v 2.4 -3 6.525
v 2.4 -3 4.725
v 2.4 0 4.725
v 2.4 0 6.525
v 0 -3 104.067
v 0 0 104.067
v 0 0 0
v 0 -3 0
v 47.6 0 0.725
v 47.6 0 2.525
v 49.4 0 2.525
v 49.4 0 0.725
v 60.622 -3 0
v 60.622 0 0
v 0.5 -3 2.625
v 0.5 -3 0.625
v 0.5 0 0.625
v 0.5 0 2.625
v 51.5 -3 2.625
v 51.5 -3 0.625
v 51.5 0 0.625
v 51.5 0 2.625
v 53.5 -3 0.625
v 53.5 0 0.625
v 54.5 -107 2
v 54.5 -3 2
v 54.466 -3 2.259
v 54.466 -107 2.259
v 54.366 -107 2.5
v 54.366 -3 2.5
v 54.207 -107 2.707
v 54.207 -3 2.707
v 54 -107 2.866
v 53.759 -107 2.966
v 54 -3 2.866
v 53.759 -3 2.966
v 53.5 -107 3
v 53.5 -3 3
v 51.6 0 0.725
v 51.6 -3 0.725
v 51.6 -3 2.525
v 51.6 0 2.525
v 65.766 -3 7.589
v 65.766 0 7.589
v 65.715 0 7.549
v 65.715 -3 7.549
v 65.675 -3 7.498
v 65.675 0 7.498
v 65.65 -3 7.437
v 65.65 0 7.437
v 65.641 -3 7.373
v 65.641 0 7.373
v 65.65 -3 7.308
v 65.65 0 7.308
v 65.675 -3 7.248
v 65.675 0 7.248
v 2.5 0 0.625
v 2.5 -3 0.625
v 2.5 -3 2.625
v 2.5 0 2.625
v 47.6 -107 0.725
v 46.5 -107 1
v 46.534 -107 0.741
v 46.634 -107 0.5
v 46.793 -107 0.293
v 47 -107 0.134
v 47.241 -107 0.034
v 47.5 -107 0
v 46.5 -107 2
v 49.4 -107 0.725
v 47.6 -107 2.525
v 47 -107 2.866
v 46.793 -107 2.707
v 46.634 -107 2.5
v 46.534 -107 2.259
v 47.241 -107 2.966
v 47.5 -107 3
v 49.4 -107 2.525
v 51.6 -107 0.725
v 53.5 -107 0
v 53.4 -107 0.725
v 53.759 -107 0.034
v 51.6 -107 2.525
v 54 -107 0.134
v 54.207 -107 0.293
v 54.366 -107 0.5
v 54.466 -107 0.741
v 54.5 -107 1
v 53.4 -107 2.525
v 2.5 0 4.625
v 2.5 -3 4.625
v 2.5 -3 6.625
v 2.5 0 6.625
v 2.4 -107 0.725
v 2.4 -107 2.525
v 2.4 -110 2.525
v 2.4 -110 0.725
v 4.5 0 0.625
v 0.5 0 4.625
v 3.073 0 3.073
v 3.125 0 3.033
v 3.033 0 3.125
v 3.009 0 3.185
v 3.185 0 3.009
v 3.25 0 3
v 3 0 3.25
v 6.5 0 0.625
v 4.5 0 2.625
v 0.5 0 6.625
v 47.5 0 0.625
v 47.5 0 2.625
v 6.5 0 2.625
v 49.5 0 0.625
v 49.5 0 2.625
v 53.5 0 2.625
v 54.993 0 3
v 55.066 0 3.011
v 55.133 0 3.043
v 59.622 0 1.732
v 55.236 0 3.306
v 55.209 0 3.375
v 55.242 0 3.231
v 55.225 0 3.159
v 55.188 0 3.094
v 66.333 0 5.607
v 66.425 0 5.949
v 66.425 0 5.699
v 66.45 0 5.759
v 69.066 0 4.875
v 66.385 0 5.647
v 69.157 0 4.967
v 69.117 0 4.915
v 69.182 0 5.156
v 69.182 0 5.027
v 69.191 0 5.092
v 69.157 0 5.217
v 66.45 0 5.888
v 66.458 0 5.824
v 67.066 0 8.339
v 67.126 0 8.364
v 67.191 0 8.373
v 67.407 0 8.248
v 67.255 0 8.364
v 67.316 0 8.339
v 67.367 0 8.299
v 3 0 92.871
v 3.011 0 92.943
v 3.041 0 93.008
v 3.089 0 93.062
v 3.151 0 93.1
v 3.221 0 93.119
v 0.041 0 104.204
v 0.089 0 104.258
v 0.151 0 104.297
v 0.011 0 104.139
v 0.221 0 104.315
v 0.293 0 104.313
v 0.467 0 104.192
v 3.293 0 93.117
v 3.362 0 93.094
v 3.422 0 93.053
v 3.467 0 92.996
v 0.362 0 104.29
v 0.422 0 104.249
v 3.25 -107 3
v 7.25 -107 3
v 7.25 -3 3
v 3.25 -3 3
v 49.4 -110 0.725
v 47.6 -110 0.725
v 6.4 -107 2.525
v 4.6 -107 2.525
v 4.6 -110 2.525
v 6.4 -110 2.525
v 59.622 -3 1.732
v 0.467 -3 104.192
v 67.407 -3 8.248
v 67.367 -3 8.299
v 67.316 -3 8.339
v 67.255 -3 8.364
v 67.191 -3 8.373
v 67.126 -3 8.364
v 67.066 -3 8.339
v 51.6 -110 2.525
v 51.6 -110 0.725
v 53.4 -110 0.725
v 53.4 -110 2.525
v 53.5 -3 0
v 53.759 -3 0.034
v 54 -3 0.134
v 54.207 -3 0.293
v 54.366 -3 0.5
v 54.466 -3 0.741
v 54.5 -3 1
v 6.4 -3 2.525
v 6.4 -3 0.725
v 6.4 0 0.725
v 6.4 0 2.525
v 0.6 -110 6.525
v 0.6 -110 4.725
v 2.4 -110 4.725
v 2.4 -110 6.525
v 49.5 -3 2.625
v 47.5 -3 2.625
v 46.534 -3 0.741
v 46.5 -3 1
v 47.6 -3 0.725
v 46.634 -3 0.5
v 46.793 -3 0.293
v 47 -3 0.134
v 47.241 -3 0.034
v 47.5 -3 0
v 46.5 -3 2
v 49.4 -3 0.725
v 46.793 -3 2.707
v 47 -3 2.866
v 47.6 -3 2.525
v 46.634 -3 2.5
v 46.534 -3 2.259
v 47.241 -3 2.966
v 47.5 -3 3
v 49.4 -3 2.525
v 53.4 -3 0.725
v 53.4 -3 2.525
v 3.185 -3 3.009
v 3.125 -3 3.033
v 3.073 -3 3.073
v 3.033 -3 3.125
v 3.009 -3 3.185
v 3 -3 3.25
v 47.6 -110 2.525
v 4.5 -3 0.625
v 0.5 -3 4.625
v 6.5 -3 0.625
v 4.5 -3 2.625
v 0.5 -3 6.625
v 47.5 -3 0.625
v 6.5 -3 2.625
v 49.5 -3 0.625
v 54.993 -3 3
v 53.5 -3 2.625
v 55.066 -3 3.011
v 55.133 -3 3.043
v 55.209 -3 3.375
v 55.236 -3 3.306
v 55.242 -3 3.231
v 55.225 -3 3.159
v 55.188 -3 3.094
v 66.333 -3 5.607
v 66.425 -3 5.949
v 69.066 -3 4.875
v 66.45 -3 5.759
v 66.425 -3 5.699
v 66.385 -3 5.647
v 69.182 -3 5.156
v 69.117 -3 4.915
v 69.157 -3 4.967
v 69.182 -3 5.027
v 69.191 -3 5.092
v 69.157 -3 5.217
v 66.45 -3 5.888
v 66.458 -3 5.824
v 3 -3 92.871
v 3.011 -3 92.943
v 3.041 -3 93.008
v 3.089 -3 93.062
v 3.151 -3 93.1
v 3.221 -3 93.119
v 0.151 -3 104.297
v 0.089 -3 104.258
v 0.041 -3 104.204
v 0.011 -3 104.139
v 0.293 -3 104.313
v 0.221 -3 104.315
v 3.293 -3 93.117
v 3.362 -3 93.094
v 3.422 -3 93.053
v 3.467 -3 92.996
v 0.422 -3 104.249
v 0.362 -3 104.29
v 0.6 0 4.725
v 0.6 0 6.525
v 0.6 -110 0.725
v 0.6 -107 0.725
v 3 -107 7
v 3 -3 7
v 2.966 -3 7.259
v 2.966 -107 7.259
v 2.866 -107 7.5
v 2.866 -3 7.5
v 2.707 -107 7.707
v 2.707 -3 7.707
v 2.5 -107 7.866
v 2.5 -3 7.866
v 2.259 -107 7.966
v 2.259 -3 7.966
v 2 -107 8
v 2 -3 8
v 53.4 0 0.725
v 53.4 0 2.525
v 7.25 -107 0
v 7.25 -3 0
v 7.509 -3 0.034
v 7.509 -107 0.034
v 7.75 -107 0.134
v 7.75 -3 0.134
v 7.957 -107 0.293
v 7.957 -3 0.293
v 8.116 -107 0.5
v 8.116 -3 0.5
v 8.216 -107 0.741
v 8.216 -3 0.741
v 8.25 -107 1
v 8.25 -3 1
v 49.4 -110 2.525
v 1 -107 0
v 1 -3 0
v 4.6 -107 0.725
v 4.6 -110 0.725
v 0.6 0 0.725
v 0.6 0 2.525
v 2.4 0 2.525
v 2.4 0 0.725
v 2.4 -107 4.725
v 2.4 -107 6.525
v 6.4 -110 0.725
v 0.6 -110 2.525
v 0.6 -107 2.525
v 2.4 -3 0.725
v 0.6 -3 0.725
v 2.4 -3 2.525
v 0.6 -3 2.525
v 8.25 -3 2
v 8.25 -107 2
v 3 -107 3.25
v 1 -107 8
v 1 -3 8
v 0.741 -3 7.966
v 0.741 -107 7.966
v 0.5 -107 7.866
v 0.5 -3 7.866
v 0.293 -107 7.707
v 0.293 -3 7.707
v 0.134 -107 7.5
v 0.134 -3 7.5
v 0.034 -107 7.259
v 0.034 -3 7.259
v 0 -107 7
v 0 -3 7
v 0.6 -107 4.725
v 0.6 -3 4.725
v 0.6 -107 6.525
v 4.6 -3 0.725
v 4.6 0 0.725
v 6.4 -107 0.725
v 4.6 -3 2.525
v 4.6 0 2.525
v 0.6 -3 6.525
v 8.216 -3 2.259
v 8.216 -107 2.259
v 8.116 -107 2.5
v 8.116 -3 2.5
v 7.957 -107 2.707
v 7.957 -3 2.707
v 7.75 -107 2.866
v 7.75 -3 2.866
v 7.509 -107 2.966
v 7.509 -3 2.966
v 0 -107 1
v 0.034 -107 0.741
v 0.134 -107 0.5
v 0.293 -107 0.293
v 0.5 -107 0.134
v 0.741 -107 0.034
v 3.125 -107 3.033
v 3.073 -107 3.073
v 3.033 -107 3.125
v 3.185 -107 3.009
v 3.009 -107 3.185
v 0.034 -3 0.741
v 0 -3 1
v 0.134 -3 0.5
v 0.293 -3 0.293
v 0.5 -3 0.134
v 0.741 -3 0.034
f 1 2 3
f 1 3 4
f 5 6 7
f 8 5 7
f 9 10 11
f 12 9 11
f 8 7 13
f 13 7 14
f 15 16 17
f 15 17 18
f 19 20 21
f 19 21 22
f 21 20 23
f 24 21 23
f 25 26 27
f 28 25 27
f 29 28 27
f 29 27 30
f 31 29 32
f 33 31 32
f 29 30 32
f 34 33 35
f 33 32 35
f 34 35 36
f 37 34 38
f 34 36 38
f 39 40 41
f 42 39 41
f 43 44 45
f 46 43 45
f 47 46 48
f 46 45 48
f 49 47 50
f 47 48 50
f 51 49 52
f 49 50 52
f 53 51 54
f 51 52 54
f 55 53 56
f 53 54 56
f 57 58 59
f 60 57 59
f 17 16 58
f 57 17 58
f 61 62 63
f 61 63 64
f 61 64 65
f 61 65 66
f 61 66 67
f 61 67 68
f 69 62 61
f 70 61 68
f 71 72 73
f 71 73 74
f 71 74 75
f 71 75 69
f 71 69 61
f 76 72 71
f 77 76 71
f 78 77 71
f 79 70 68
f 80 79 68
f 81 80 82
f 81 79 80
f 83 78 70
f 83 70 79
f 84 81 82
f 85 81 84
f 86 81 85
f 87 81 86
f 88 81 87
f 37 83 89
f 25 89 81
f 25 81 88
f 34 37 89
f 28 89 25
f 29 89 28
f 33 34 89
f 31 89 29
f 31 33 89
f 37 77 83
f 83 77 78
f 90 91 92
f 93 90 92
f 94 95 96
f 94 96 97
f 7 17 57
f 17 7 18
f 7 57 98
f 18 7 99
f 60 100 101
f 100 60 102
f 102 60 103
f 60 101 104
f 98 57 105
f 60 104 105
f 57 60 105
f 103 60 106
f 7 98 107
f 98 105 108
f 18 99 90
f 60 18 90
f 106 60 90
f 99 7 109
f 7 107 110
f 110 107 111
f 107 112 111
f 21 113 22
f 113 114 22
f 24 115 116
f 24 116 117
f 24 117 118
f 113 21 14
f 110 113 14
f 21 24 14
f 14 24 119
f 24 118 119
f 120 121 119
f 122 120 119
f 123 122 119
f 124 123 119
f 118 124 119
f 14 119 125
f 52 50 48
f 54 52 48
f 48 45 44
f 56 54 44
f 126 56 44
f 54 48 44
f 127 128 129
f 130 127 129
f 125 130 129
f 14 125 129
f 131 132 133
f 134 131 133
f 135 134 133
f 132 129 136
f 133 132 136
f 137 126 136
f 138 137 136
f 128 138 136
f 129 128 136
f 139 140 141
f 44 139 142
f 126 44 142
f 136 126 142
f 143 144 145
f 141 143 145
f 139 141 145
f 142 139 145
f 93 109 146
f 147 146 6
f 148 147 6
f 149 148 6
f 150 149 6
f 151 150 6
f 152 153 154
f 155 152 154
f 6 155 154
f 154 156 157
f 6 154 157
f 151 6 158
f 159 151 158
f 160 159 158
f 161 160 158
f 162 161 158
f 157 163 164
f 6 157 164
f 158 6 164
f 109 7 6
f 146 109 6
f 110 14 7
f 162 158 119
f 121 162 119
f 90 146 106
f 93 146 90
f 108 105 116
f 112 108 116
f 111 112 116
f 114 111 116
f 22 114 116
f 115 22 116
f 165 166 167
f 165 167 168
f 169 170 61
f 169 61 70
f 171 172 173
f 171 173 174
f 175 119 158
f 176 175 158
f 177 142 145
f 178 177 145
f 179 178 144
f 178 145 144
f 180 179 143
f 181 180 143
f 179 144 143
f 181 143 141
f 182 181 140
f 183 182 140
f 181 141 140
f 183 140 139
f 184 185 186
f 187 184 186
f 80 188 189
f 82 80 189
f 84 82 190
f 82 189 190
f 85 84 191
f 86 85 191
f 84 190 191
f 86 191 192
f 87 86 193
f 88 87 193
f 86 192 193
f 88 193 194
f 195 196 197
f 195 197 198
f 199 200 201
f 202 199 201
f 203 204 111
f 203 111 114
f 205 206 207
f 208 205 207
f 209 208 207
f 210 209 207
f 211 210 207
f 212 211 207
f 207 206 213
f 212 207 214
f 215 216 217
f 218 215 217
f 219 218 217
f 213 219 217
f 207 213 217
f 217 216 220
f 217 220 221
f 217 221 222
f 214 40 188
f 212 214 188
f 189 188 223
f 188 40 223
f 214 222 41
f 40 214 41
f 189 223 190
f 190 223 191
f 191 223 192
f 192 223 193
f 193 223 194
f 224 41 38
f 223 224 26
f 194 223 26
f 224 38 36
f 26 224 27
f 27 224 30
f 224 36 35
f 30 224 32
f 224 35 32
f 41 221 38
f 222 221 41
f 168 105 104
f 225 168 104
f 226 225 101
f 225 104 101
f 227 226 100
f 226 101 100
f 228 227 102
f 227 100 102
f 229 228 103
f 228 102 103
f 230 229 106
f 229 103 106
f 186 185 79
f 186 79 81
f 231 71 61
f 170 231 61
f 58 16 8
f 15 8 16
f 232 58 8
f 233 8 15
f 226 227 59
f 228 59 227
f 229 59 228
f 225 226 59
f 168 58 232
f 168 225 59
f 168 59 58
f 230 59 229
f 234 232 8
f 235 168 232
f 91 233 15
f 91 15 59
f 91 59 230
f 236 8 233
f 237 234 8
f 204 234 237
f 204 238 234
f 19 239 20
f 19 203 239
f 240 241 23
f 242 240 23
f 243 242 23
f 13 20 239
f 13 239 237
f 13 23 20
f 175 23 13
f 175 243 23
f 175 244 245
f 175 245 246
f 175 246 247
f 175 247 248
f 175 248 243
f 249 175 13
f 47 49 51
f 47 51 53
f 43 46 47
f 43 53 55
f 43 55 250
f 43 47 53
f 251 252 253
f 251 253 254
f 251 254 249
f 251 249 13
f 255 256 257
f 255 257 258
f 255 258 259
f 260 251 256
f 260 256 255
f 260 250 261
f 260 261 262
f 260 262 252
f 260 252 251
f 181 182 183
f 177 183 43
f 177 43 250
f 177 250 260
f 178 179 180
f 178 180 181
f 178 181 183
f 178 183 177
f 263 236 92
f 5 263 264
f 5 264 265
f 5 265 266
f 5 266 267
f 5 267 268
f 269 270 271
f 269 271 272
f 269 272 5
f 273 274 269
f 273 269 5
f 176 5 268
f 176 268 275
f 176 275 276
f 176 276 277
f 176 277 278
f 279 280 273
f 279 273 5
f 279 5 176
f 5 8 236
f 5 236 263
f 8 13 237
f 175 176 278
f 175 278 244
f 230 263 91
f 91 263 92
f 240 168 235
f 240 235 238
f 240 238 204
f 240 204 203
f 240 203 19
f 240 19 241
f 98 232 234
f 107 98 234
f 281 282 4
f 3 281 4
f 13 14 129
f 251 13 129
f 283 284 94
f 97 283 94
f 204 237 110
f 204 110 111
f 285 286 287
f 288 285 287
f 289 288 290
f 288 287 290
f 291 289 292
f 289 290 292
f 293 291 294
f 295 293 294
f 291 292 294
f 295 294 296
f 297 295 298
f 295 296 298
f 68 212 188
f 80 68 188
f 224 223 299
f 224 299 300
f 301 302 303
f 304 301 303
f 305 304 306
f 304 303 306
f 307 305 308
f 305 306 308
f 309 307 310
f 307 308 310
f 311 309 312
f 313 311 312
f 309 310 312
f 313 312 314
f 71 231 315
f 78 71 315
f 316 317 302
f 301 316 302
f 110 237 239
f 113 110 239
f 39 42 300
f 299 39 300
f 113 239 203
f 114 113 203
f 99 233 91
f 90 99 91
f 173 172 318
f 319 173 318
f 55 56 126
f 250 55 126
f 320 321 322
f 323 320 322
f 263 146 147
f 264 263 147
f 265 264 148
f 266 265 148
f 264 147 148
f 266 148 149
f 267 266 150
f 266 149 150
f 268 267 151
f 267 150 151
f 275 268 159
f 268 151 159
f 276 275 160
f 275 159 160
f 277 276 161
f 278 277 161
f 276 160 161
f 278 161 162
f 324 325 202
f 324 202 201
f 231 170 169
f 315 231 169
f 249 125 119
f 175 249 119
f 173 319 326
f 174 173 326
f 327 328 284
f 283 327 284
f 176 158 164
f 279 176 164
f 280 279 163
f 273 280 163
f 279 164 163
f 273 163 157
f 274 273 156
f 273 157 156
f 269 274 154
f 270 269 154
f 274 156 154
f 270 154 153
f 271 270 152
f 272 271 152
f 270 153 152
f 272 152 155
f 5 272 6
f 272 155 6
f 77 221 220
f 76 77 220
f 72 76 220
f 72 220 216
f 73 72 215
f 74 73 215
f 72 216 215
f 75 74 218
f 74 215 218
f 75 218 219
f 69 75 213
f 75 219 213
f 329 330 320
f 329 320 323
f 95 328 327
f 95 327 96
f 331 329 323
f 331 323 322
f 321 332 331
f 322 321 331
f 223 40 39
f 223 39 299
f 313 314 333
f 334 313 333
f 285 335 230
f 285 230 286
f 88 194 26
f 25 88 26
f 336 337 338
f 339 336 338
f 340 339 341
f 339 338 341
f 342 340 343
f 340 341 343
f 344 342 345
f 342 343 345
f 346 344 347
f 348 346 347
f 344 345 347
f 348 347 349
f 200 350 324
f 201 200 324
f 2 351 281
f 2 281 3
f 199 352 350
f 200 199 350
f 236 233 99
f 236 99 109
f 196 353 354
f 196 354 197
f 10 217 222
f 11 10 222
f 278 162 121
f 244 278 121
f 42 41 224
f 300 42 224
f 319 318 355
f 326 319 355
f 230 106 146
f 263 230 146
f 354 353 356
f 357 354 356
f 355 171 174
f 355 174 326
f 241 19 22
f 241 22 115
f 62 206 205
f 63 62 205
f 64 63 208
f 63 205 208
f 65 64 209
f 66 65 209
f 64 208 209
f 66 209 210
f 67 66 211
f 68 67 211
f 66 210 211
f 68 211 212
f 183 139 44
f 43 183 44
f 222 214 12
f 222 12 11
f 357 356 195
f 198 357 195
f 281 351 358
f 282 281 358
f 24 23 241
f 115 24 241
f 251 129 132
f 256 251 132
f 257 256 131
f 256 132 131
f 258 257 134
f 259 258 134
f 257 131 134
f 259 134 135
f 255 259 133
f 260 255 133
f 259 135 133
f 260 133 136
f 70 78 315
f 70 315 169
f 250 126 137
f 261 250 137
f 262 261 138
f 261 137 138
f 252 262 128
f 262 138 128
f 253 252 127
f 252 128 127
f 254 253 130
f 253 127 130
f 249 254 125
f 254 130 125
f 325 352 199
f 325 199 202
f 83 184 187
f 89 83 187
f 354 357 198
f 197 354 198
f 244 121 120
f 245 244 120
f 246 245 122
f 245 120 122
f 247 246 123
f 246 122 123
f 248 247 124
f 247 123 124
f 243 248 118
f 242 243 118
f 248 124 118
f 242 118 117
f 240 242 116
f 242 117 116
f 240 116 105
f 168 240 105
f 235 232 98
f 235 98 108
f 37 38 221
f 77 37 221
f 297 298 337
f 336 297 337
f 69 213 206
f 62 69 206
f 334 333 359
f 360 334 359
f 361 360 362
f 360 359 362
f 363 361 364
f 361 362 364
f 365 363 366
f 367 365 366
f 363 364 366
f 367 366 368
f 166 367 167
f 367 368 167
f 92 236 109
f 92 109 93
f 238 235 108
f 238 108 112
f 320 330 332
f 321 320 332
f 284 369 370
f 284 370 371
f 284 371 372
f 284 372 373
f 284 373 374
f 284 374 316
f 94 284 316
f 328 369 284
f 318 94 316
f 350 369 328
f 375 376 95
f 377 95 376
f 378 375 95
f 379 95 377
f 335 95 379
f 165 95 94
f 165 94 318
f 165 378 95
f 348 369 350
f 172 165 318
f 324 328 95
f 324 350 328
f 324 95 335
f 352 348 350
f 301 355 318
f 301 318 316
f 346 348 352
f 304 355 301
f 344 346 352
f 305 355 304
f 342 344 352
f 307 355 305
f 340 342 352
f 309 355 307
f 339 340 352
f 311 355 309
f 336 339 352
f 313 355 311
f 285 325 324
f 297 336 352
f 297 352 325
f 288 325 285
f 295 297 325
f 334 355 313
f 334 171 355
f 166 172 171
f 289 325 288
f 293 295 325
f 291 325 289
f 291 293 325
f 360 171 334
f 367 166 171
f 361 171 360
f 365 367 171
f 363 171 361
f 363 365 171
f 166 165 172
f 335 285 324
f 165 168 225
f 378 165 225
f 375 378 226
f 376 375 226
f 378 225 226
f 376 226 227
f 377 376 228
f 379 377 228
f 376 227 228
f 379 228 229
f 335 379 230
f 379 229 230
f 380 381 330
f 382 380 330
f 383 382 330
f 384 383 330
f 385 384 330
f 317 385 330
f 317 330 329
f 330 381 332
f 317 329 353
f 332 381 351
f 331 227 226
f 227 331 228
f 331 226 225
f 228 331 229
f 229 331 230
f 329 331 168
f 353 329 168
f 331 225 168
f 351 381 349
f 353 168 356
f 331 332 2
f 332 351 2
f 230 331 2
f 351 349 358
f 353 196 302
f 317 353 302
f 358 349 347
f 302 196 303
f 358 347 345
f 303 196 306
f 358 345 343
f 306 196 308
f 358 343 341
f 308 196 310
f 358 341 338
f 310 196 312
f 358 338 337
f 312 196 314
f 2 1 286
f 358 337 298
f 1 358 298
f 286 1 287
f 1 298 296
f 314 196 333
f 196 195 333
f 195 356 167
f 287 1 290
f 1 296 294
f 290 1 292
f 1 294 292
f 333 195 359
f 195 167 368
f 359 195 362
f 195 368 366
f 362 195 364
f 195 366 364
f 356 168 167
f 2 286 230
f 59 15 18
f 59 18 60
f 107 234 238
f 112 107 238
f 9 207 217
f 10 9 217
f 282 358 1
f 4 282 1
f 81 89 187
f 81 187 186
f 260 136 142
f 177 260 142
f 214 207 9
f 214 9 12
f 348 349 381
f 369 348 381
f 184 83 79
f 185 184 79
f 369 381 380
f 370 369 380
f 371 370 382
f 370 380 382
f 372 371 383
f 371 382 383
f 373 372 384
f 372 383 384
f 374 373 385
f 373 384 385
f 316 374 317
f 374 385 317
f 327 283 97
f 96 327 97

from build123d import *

# Parameters (mm, degrees)
F1_DEPTH  = 3
F2_W      = 2
F2_H      = 2
F2_W_2    = 1.8
F2_H_2    = 1.8
F3_DEPTH  = 3
F5_DEPTH  = 104
F6_DEPTH  = 3
F7_DEPTH  = 3
F6_FACE_W = 1.8
F6_FACE_H = 1.8
F8_DEPTH  = 110
F7_FACE_W = 1.8
F7_FACE_H = 1.8
F9_DEPTH  = 110


with BuildPart() as f1:
    # F0 (on Front) → F1 (new body)
    with BuildSketch(Plane.XZ):
        with BuildLine():
            Line((0, 104.066987), (0, 0))
            Line((0, 0), (60.621778, 0))
            Line((60.621778, 0), (59.621778, 1.732051))
            Line((59.621778, 1.732051), (0.466506, 104.191987))
            ThreePointArc((0.466506, 104.191987), (0.185295, 104.308469), (0, 104.066987))
        make_face()
        with BuildLine():
            ThreePointArc((3, 92.870835), (3.185295, 93.112316), (3.466506, 92.995835))
            Line((3.466506, 92.995835), (55.209119, 3.375))
            ThreePointArc((55.209119, 3.375), (55.209119, 3.125), (54.992613, 3))
            Line((54.992613, 3), (3.25, 3))
            ThreePointArc((3.25, 3), (3.073223, 3.073223), (3, 3.25))
            Line((3, 3.25), (3, 92.870835))
        make_face(mode=Mode.SUBTRACT)
        with BuildLine():
            Line((59.621778, 1.732051), (60.621778, 0))
            Line((60.621778, 0), (69.065526, 4.875))
            ThreePointArc((69.065526, 4.875), (69.182007, 5.026802), (69.157032, 5.216506))
            Line((69.157032, 5.216506), (67.407032, 8.247595))
            ThreePointArc((67.407032, 8.247595), (67.255231, 8.364077), (67.065526, 8.339102))
            Line((67.065526, 8.339102), (65.766488, 7.589102))
            ThreePointArc((65.766488, 7.589102), (65.650006, 7.4373), (65.674981, 7.247595))
            Line((65.674981, 7.247595), (66.424981, 5.948557))
            ThreePointArc((66.424981, 5.948557), (66.449957, 5.758852), (66.333475, 5.607051))
            Line((66.333475, 5.607051), (59.621778, 1.732051))
        make_face()
    extrude(amount=F1_DEPTH)

    # F2 (on face) → F3 (cut, through all)
    with BuildSketch(Plane.XZ.offset(3)):
        with Locations((1.5, 1.625)):
            Rectangle(F2_W, F2_H)
        with Locations((1.5, 1.625)):
            Rectangle(F2_W_2, F2_H_2, mode=Mode.SUBTRACT)
        with Locations((1.5, 5.625)):
            Rectangle(F2_W, F2_H)
        with Locations((1.5, 5.625)):
            Rectangle(F2_W_2, F2_H_2, mode=Mode.SUBTRACT)
        with Locations((5.5, 1.625)):
            Rectangle(F2_W, F2_H)
        with Locations((5.5, 1.625)):
            Rectangle(F2_W_2, F2_H_2, mode=Mode.SUBTRACT)
        with Locations((52.5, 1.625)):
            Rectangle(F2_W, F2_H)
        with Locations((52.5, 1.625)):
            Rectangle(F2_W_2, F2_H_2, mode=Mode.SUBTRACT)
        with Locations((48.5, 1.625)):
            Rectangle(F2_W, F2_H)
        with Locations((48.5, 1.625)):
            Rectangle(F2_W_2, F2_H_2, mode=Mode.SUBTRACT)
        with Locations((1.5, 5.625)):
            Rectangle(F2_W_2, F2_H_2)
        with Locations((1.5, 1.625)):
            Rectangle(F2_W_2, F2_H_2)
        with Locations((5.5, 1.625)):
            Rectangle(F2_W_2, F2_H_2)
        with Locations((48.5, 1.625)):
            Rectangle(F2_W_2, F2_H_2)
        with Locations((52.5, 1.625)):
            Rectangle(F2_W_2, F2_H_2)
    extrude(amount=-F3_DEPTH, mode=Mode.SUBTRACT)


with BuildPart() as f5:
    # F4 (on face) → F5 (new body)
    with BuildSketch(Plane.XZ.offset(3)):
        with BuildLine():
            Line((2, 8), (1, 8))
            ThreePointArc((1, 8), (0.292893, 7.707107), (0, 7))
            Line((0, 7), (0, 1))
            ThreePointArc((0, 1), (0.292893, 0.292893), (1, 0))
            Line((1, 0), (3, 0))
            Line((3, 0), (3, 3.25))
            Line((3, 3.25), (3, 7))
            ThreePointArc((3, 7), (2.707107, 7.707107), (2, 8))
        make_face()
        with BuildLine():
            ThreePointArc((3.25, 3), (3.073223, 3.073223), (3, 3.25))
            Line((3, 3.25), (3, 0))
            Line((3, 0), (3.25, 0))
            Line((3.25, 0), (3.25, 3))
        make_face()
        with BuildLine():
            Line((7.25, 3), (3.25, 3))
            Line((3.25, 3), (3.25, 0))
            Line((3.25, 0), (7.25, 0))
            ThreePointArc((7.25, 0), (7.957107, 0.292893), (8.25, 1))
            Line((8.25, 1), (8.25, 2))
            ThreePointArc((8.25, 2), (7.957107, 2.707107), (7.25, 3))
        make_face()
        with BuildLine():
            Line((53.5, 3), (47.5, 3))
            ThreePointArc((47.5, 3), (46.792893, 2.707107), (46.5, 2))
            Line((46.5, 2), (46.5, 1))
            ThreePointArc((46.5, 1), (46.792893, 0.292893), (47.5, 0))
            Line((47.5, 0), (53.5, 0))
            ThreePointArc((53.5, 0), (54.207107, 0.292893), (54.5, 1))
            Line((54.5, 1), (54.5, 2))
            ThreePointArc((54.5, 2), (54.207107, 2.707107), (53.5, 3))
        make_face()
    extrude(amount=F5_DEPTH)

    # F2 (on face) → F6 (join)
    with BuildSketch(Plane.XZ.offset(3)):
        with Locations((1.5, 5.625)):
            Rectangle(F2_W_2, F2_H_2)
        with Locations((1.5, 1.625)):
            Rectangle(F2_W_2, F2_H_2)
        with Locations((5.5, 1.625)):
            Rectangle(F2_W_2, F2_H_2)
    extrude(amount=-F6_DEPTH)

    # F2 (on face) → F7 (join)
    with BuildSketch(Plane.XZ.offset(3)):
        with Locations((52.5, 1.625)):
            Rectangle(F2_W_2, F2_H_2)
        with Locations((48.5, 1.625)):
            Rectangle(F2_W_2, F2_H_2)
    extrude(amount=-F7_DEPTH)

    # F6_face (on face) → F8 (join)
    with BuildSketch(Plane(origin=(5.5, 0, 1.625), x_dir=(1, 0, 0), z_dir=(0, 1, 0))):
        Rectangle(F6_FACE_W, F6_FACE_H)
        with Locations((-4, 0)):
            Rectangle(F6_FACE_W, F6_FACE_H)
        with Locations((-4, -4)):
            Rectangle(F6_FACE_W, F6_FACE_H)
    extrude(amount=-F8_DEPTH)

    # F7_face (on face) → F9 (join)
    with BuildSketch(Plane(origin=(52.5, 0, 1.625), x_dir=(1, 0, 0), z_dir=(0, 1, 0))):
        Rectangle(F7_FACE_W, F7_FACE_H)
        with Locations((-4, 0)):
            Rectangle(F7_FACE_W, F7_FACE_H)
    extrude(amount=-F9_DEPTH)


solid = Compound([f1.part, f5.part])
